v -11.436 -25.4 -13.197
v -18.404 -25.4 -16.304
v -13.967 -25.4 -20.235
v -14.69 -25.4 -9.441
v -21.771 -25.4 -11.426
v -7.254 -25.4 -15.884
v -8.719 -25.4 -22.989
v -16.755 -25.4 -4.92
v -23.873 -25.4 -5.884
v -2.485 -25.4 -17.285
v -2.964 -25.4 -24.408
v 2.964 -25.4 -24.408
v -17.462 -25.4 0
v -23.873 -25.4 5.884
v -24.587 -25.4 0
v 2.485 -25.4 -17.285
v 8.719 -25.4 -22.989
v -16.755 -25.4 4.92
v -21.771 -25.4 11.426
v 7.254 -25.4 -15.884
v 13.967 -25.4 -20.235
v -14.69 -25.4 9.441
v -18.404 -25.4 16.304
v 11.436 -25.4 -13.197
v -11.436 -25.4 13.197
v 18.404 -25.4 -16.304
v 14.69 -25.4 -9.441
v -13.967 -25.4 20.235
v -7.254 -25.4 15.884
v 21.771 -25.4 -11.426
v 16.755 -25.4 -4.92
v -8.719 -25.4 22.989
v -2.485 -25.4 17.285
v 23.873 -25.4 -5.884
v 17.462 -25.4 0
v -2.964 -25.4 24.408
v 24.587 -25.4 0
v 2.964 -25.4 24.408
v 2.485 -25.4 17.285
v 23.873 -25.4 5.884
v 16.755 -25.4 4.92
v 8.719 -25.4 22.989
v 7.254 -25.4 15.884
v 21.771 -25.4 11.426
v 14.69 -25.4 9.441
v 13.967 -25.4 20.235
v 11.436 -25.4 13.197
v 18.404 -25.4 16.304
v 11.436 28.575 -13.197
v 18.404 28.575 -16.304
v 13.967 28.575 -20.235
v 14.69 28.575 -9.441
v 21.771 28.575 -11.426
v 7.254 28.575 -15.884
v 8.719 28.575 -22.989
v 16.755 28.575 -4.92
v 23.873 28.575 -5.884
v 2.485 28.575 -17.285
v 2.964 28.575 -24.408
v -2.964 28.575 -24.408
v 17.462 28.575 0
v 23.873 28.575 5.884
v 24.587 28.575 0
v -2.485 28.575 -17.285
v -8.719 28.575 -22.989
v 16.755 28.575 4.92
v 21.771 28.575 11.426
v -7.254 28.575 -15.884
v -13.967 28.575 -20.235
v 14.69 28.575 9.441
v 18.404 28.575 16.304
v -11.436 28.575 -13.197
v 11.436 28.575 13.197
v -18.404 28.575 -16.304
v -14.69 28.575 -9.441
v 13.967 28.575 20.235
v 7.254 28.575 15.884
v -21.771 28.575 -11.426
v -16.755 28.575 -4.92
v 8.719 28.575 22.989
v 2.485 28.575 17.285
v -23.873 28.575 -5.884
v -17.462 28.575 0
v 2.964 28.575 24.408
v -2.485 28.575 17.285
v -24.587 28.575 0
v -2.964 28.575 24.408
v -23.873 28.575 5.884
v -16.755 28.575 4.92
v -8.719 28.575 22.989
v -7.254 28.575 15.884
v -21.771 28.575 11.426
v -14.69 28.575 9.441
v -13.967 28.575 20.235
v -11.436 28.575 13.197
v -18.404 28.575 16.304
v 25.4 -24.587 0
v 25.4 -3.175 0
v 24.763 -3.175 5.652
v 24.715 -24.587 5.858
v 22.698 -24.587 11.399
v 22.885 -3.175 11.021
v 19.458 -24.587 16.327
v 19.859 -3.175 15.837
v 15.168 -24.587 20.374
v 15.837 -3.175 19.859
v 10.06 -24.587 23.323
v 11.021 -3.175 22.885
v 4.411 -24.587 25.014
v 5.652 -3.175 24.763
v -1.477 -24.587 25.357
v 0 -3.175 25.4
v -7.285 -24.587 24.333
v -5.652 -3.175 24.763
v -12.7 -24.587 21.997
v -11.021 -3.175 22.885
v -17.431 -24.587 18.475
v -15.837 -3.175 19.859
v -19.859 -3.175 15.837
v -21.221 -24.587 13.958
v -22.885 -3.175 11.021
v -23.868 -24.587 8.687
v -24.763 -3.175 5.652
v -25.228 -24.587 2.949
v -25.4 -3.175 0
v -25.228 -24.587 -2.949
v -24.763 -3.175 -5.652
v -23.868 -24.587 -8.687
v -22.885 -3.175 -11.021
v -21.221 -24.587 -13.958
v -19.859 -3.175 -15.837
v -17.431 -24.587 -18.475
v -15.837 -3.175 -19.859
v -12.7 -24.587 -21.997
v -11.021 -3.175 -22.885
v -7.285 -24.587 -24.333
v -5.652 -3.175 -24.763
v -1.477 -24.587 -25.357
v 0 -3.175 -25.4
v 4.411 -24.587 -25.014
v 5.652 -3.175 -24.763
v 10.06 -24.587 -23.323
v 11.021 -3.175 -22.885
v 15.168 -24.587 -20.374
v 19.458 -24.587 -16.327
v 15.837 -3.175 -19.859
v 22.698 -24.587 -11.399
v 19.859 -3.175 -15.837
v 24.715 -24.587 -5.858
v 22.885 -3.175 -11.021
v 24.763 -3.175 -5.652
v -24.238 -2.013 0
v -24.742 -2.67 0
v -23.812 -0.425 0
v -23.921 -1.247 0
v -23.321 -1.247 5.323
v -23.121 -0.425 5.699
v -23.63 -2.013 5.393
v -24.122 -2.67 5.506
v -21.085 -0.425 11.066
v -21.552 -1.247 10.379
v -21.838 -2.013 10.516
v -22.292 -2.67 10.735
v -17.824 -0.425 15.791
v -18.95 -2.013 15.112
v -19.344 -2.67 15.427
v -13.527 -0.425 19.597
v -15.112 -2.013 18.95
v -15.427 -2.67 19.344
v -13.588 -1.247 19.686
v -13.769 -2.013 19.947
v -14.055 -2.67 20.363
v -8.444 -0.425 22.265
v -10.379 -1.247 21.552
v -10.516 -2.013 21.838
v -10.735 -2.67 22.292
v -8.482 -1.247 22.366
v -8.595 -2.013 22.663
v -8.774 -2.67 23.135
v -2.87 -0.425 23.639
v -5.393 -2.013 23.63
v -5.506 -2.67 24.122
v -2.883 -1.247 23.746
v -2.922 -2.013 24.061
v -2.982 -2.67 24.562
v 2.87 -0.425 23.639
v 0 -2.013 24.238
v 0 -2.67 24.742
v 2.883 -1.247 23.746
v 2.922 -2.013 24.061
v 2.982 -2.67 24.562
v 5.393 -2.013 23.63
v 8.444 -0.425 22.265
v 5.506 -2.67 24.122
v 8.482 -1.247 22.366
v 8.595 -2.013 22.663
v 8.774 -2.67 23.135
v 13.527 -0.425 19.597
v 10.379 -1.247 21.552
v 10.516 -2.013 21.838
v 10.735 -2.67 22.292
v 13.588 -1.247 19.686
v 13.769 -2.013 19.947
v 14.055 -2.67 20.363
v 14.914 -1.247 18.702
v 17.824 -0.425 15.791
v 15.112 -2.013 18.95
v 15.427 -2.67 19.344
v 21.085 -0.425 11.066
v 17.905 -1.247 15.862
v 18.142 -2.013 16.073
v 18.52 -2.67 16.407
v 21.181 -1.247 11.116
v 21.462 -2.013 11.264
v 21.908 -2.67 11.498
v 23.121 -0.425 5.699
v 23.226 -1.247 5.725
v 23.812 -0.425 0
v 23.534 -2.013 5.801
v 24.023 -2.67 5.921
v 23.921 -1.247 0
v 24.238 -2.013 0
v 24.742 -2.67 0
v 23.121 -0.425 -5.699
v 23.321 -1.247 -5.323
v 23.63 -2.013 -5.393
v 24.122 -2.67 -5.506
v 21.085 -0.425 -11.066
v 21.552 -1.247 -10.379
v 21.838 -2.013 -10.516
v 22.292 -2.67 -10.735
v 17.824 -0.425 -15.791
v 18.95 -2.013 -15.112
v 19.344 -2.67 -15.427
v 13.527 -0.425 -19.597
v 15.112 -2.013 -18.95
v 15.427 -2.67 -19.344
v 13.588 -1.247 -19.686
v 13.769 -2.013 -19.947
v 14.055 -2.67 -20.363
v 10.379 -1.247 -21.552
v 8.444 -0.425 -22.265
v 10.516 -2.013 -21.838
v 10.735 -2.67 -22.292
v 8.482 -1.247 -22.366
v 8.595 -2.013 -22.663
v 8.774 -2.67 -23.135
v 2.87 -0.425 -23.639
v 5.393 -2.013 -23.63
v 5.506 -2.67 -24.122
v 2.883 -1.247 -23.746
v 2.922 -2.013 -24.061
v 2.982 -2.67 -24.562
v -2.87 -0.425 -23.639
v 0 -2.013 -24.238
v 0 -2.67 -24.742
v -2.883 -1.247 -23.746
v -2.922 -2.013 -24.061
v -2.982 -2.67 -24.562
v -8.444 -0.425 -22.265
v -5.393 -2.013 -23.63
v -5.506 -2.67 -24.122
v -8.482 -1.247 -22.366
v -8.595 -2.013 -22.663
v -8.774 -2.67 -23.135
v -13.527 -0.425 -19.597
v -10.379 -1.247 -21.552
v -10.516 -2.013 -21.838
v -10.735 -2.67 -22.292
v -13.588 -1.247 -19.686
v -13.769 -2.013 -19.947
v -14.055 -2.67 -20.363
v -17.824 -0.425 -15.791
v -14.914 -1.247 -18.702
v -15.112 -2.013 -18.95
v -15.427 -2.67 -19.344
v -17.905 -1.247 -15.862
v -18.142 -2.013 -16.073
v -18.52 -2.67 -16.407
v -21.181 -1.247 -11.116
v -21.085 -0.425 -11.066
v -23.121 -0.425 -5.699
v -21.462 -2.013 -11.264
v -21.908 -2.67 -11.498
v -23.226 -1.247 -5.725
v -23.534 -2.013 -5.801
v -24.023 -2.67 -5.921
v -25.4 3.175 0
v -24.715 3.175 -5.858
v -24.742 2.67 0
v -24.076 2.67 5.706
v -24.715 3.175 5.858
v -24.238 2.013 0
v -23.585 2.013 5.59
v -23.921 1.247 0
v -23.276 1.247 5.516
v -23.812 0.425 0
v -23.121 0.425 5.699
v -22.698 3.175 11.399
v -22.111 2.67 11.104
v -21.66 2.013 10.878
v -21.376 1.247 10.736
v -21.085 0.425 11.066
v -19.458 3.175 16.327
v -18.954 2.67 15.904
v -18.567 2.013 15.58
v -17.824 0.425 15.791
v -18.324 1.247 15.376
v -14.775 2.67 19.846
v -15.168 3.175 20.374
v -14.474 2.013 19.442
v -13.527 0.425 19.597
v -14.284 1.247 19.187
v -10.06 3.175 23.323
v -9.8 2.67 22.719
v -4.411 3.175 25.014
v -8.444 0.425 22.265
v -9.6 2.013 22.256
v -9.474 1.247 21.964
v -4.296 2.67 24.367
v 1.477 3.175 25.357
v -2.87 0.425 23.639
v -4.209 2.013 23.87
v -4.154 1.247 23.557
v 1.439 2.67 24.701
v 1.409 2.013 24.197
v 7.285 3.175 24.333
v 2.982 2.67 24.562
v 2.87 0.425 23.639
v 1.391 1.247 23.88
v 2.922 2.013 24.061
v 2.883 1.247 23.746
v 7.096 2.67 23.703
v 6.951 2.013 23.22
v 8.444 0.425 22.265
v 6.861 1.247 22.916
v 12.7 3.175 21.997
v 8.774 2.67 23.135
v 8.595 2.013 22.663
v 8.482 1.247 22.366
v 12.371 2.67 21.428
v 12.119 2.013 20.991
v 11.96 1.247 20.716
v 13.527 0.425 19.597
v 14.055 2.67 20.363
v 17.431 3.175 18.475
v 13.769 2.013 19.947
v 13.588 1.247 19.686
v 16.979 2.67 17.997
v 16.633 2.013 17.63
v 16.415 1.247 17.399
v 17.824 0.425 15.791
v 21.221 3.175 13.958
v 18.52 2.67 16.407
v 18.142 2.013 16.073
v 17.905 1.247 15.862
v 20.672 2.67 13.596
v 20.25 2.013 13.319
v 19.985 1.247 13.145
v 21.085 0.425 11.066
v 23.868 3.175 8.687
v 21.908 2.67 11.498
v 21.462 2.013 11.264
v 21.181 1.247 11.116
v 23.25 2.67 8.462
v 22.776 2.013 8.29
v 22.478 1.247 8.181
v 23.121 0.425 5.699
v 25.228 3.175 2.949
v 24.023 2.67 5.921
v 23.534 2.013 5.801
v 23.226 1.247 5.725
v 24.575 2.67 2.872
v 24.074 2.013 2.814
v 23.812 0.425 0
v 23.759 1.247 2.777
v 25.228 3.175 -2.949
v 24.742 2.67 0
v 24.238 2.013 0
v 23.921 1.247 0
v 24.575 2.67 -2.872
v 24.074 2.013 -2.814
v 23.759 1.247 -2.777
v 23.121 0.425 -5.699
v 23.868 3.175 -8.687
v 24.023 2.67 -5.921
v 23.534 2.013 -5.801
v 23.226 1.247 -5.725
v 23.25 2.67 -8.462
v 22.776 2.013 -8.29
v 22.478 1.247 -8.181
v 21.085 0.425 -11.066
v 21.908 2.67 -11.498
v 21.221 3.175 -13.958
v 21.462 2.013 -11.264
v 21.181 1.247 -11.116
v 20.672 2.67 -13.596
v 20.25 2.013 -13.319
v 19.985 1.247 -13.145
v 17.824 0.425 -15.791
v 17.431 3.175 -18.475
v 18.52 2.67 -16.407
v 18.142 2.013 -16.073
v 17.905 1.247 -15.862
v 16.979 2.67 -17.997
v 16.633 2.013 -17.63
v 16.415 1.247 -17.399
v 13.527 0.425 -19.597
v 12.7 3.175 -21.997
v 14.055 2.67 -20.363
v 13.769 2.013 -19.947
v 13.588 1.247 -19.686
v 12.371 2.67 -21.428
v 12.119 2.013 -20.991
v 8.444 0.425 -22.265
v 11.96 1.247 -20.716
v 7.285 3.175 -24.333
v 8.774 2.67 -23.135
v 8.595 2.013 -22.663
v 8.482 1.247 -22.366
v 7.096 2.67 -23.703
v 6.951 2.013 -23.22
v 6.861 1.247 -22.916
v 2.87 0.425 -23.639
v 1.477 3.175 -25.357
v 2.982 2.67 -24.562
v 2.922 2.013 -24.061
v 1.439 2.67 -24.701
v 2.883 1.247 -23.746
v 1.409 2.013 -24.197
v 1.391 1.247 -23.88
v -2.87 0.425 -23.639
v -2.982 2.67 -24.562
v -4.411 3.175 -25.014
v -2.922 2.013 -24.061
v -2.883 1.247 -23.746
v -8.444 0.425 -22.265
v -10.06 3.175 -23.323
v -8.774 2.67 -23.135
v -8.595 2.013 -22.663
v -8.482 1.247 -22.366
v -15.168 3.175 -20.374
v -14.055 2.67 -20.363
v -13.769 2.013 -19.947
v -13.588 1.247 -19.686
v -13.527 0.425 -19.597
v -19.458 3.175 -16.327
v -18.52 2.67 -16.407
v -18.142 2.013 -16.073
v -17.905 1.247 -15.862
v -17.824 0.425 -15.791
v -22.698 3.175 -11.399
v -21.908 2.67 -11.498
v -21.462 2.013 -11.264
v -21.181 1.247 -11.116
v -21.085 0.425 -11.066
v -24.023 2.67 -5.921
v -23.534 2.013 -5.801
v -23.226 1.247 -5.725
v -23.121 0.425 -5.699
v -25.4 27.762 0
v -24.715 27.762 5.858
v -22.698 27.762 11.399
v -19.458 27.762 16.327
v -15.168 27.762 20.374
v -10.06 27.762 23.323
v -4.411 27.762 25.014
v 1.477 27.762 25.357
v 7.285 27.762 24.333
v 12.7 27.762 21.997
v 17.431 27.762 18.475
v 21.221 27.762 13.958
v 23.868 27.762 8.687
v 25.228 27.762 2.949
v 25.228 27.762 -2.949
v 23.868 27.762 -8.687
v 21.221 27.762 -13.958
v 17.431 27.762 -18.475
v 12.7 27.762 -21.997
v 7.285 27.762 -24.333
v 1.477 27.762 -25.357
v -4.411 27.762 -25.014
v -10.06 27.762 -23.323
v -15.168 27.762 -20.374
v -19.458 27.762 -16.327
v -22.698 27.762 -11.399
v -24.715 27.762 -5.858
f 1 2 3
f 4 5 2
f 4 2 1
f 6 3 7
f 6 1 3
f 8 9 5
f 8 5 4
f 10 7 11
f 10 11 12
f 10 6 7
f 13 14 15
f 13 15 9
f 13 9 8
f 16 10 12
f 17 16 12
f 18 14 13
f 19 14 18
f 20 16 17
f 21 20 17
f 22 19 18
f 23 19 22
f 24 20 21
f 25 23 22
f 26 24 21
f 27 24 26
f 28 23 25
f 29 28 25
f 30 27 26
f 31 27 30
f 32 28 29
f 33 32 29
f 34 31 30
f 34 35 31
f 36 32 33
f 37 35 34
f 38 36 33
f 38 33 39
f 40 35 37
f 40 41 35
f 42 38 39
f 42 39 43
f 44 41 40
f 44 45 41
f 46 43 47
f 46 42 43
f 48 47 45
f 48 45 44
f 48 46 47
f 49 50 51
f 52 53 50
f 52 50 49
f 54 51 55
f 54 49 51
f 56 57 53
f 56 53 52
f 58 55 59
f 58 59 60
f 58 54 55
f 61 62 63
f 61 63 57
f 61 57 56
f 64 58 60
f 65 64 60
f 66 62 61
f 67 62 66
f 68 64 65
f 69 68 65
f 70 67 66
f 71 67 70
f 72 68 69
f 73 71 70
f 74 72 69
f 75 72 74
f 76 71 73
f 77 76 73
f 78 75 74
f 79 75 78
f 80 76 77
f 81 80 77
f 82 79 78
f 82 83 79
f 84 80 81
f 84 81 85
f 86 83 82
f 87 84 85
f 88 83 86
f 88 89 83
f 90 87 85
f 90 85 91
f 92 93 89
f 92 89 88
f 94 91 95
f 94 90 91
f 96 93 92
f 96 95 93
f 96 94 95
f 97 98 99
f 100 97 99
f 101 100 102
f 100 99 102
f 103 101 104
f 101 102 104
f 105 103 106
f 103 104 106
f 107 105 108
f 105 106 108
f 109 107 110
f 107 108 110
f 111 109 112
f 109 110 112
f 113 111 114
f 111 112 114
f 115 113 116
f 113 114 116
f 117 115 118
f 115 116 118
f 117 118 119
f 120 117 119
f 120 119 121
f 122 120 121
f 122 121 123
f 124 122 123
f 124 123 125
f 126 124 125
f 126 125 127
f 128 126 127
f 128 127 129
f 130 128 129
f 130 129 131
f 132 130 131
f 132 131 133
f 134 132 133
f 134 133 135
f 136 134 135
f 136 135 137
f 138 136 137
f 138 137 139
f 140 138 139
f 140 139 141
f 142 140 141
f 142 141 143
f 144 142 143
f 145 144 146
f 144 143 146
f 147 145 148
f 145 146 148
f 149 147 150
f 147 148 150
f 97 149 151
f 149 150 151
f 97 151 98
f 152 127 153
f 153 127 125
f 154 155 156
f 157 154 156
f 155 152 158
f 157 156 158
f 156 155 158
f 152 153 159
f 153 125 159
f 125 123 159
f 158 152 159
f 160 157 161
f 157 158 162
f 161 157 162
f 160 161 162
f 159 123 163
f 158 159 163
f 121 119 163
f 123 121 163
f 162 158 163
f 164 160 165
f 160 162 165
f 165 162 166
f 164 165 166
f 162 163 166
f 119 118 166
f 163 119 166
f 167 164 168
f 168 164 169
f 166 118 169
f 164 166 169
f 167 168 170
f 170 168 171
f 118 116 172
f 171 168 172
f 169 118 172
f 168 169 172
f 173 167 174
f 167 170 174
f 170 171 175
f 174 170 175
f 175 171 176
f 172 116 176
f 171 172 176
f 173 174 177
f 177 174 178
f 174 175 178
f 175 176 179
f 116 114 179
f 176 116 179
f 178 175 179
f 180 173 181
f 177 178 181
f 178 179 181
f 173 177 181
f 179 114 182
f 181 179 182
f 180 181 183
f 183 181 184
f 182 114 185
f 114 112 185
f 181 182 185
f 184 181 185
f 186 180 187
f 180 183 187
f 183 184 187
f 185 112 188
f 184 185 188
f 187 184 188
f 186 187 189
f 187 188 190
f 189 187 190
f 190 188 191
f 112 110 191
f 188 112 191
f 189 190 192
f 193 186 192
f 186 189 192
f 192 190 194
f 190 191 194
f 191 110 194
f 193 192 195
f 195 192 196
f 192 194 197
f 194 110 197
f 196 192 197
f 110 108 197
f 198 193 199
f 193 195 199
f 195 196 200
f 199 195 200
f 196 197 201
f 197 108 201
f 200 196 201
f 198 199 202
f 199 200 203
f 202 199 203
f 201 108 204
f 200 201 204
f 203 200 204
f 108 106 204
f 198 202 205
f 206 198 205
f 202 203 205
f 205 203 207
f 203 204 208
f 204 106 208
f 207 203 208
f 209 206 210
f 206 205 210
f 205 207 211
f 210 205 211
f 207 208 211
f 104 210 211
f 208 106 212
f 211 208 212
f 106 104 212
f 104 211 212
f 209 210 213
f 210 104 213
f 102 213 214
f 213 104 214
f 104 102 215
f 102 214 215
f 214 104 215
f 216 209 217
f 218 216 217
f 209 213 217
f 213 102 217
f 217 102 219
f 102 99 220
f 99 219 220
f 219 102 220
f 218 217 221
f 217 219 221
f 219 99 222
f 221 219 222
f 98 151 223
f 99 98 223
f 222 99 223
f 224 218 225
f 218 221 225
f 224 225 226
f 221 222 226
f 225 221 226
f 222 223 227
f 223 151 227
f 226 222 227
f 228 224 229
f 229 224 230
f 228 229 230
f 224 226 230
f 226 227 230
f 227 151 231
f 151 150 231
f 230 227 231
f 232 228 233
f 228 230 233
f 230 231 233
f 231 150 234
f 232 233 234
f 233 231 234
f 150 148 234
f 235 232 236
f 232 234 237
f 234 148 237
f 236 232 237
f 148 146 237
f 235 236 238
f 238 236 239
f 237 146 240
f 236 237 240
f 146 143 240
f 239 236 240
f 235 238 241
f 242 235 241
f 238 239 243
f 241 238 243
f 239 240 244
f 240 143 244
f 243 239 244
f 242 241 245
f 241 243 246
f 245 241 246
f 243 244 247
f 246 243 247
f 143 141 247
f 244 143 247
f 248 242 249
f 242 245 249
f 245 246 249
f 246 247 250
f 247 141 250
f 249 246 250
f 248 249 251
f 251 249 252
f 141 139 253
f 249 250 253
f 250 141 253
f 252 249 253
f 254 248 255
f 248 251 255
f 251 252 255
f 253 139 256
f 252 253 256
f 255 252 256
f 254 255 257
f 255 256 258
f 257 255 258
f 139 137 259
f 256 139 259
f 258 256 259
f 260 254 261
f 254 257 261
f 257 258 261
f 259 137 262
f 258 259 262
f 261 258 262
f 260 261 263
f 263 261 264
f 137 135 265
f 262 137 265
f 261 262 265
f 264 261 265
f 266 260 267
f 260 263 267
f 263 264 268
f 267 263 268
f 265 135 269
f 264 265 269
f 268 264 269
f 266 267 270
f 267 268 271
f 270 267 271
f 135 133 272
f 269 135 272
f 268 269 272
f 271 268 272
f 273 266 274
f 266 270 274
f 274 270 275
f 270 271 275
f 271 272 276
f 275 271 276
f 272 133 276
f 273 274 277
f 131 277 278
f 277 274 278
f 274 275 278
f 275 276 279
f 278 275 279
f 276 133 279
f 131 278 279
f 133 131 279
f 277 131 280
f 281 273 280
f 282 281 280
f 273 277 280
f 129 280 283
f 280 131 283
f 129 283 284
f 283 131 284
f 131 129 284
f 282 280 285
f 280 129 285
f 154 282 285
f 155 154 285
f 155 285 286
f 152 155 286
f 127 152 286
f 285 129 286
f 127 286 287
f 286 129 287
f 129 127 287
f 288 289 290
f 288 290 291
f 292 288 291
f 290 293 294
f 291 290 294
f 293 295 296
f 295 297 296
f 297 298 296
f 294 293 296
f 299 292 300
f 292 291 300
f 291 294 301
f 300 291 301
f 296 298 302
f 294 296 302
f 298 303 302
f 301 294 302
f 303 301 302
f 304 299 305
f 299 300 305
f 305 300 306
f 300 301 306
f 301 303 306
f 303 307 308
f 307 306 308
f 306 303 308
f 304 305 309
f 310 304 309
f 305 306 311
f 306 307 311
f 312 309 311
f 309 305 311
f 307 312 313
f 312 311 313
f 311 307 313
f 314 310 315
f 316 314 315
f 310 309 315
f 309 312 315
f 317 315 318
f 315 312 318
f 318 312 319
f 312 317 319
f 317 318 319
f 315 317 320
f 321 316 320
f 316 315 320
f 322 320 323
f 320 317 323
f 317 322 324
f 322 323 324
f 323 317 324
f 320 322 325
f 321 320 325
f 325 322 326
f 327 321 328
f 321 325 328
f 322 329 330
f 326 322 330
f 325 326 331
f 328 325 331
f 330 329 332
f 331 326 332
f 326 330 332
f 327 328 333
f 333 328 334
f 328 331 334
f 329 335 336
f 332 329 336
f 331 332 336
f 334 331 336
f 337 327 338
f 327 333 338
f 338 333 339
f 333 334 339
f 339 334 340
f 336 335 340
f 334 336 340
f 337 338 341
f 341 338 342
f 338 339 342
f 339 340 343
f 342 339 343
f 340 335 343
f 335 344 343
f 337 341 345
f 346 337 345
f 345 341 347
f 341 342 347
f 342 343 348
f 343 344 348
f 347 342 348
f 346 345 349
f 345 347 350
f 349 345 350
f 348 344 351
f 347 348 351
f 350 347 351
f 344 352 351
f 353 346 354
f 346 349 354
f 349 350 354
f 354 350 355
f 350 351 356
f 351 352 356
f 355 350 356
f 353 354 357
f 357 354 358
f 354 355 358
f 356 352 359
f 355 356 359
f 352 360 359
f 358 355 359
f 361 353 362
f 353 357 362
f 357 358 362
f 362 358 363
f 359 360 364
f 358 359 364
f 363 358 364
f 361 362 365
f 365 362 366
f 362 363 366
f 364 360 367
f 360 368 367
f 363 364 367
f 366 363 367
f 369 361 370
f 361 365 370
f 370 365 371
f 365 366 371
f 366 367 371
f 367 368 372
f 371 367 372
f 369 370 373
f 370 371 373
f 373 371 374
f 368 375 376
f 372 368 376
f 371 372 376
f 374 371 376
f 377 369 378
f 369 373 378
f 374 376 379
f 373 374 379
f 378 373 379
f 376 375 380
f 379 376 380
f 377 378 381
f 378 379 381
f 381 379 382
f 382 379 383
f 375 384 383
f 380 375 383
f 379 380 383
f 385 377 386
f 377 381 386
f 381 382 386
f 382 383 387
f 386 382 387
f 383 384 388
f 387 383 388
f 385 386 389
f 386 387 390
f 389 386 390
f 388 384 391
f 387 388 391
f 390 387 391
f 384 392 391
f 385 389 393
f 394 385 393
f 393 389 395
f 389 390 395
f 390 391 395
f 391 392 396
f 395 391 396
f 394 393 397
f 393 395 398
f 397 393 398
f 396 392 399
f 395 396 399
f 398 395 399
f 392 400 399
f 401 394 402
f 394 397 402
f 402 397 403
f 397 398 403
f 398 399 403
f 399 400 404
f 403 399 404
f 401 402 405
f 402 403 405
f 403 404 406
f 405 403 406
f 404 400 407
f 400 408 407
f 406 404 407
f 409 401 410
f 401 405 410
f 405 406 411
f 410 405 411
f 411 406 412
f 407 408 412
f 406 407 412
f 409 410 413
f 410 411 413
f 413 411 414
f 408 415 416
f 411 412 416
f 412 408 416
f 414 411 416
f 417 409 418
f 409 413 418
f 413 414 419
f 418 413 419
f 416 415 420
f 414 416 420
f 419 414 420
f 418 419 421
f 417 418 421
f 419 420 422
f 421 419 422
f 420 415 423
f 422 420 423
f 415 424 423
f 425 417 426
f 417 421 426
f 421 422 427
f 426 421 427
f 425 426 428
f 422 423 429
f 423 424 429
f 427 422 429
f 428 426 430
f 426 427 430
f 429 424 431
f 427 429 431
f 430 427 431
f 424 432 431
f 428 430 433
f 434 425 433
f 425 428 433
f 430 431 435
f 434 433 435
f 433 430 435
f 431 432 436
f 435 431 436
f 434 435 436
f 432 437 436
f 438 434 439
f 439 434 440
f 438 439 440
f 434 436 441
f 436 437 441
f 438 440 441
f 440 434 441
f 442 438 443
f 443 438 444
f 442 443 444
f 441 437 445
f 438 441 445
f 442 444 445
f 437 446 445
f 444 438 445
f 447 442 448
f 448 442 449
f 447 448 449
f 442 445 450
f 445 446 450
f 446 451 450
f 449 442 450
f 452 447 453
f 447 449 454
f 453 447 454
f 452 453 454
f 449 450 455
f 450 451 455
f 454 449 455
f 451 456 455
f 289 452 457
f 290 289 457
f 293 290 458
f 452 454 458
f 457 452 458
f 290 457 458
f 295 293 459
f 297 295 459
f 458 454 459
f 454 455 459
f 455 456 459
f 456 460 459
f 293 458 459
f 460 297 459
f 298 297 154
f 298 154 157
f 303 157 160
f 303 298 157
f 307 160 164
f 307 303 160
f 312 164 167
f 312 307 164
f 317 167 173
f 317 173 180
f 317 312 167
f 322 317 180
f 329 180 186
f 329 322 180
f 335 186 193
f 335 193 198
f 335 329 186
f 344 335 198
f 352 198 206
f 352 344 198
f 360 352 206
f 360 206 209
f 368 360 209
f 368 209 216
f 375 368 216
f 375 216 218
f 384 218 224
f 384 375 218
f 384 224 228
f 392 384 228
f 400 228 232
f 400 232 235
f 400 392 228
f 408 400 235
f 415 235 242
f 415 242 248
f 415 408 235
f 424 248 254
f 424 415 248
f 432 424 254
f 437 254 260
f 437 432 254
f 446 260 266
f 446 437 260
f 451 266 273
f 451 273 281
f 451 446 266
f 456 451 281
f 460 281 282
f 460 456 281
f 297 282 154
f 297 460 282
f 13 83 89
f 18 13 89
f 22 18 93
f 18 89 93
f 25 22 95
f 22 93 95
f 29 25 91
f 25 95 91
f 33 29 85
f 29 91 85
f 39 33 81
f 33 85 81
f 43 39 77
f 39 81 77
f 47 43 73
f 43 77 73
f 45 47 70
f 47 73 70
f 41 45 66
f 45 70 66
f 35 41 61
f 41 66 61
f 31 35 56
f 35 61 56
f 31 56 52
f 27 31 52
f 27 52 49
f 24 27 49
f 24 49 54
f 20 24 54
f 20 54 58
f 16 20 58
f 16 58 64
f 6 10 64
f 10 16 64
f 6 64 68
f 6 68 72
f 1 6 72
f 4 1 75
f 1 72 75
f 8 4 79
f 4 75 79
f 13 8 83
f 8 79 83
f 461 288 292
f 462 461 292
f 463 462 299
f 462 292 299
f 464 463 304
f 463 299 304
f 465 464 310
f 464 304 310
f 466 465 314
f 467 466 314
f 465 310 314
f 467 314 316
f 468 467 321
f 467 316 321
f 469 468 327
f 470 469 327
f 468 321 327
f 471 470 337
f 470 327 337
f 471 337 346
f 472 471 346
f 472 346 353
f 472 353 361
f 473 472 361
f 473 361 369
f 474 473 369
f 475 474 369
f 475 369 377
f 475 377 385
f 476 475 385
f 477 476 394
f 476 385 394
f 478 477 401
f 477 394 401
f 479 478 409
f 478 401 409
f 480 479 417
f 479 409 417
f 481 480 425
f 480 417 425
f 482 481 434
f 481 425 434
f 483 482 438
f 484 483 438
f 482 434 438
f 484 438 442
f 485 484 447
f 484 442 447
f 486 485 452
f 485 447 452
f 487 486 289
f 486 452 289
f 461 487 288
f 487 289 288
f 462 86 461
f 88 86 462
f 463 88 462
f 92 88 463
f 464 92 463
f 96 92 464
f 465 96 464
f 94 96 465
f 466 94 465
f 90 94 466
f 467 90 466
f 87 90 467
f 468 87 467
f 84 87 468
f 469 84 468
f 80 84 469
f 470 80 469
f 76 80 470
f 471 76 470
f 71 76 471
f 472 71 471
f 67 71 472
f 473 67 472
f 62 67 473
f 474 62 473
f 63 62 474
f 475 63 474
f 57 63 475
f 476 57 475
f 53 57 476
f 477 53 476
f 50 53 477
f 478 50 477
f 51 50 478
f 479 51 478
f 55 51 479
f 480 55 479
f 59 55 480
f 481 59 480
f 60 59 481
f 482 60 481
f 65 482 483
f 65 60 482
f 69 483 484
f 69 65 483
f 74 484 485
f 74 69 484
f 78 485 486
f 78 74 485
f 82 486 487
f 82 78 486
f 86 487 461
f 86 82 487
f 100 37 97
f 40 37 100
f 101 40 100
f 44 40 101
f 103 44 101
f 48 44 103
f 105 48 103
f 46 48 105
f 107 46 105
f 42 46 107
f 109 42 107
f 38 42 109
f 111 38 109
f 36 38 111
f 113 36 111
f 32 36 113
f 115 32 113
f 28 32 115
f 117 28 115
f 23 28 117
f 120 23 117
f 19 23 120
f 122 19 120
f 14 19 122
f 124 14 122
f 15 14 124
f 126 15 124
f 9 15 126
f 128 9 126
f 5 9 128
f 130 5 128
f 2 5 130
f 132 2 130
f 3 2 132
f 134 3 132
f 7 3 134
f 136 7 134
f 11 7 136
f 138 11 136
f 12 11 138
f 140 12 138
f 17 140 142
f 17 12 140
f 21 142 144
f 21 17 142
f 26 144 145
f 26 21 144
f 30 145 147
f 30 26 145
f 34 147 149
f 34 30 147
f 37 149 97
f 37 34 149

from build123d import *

# Parameters (mm, degrees)
F0_R      = 25.4
F0_R_2    = 17.4625
F1_DEPTH  = 25.4
F2_R      = 25.4
F2_R_2    = 23.8125
F3_DEPTH  = 3.175
F4_DEPTH  = 3.175
F5_R      = 25.4
F6_DEPTH  = 25.4
F8_SIZE   = 0.8128
F9_R      = 17.4625
F10_DEPTH = 53.976


# Not quite as in the source:
# - a fillet or chamfer that OpenCascade refuses, or shapes differently, is made with other operations: its cross-section is extruded or revolved along the edge and cut away or added


with BuildPart() as f1:
    # F0 (on Front) → F1 (new body)
    with BuildSketch(Plane.XZ):
        Circle(F0_R)
        Circle(F0_R_2, mode=Mode.SUBTRACT)
    extrude(amount=F1_DEPTH)

    # F2 (on face) → F3 (cut)
    with BuildSketch(Plane(origin=(0, 0, 0), x_dir=(-1, 0, 0), z_dir=(0, 1, 0))):
        Circle(F2_R)
        Circle(F2_R_2, mode=Mode.SUBTRACT)
    extrude(amount=-F3_DEPTH, mode=Mode.SUBTRACT)

    # F4 (add): a face of the model
    f4_faces = [f1.faces().sort_by_distance(p)[0] for p in [
        (23.1389807909, 0, 0),
    ]]
    extrude(f4_faces, amount=F4_DEPTH)

    # F5 (on face) → F6 (join)
    with BuildSketch(Plane(origin=(0, 3.175, 0), x_dir=(-1, 0, 0), z_dir=(0, 1, 0))):
        Circle(F5_R)
    extrude(amount=F6_DEPTH)

    # F7: fillet of radius 3.175 on 2 edges, made by hand

    # F7_s1 → F7_t2 (revolve)
    with BuildSketch(Plane.XY):
        with BuildLine():
            ThreePointArc((-23.8125, -0.425369343), (-24.237869343, -2.012869343), (-25.4, -3.175))
            Line((-25.4, -3.175), (-23.8125, -3.175))
            Line((-23.8125, -3.175), (-23.8125, -0.425369343))
        make_face()
    revolve(axis=Axis((0, -3.175, 0), (0, 1, 0)))

    # F7_s3 → F7_t4 (revolve)
    with BuildSketch(Plane.XY):
        with BuildLine():
            ThreePointArc((-25.4, 3.175), (-24.237869343, 2.012869343), (-23.8125, 0.425369343))
            Line((-23.8125, 0.425369343), (-23.8125, 3.175))
            Line((-23.8125, 3.175), (-25.4, 3.175))
        make_face()
    revolve(axis=Axis((0, 3.175, 0), (0, 1, 0)))

    # F8
    f8_edges = [f1.edges().sort_by_distance(p)[0] for p in [
        (-25.4, -25.4, 0),
        (25.4, 28.575, 0),
    ]]
    chamfer(f8_edges, length=F8_SIZE)

    # F9 (on face) → F10 (cut, through all)
    with BuildSketch(Plane(origin=(0, 28.575, 0), x_dir=(-1, 0, 0), z_dir=(0, 1, 0))):
        Circle(F9_R)
    extrude(amount=-F10_DEPTH, mode=Mode.SUBTRACT)


solid = f1.part
